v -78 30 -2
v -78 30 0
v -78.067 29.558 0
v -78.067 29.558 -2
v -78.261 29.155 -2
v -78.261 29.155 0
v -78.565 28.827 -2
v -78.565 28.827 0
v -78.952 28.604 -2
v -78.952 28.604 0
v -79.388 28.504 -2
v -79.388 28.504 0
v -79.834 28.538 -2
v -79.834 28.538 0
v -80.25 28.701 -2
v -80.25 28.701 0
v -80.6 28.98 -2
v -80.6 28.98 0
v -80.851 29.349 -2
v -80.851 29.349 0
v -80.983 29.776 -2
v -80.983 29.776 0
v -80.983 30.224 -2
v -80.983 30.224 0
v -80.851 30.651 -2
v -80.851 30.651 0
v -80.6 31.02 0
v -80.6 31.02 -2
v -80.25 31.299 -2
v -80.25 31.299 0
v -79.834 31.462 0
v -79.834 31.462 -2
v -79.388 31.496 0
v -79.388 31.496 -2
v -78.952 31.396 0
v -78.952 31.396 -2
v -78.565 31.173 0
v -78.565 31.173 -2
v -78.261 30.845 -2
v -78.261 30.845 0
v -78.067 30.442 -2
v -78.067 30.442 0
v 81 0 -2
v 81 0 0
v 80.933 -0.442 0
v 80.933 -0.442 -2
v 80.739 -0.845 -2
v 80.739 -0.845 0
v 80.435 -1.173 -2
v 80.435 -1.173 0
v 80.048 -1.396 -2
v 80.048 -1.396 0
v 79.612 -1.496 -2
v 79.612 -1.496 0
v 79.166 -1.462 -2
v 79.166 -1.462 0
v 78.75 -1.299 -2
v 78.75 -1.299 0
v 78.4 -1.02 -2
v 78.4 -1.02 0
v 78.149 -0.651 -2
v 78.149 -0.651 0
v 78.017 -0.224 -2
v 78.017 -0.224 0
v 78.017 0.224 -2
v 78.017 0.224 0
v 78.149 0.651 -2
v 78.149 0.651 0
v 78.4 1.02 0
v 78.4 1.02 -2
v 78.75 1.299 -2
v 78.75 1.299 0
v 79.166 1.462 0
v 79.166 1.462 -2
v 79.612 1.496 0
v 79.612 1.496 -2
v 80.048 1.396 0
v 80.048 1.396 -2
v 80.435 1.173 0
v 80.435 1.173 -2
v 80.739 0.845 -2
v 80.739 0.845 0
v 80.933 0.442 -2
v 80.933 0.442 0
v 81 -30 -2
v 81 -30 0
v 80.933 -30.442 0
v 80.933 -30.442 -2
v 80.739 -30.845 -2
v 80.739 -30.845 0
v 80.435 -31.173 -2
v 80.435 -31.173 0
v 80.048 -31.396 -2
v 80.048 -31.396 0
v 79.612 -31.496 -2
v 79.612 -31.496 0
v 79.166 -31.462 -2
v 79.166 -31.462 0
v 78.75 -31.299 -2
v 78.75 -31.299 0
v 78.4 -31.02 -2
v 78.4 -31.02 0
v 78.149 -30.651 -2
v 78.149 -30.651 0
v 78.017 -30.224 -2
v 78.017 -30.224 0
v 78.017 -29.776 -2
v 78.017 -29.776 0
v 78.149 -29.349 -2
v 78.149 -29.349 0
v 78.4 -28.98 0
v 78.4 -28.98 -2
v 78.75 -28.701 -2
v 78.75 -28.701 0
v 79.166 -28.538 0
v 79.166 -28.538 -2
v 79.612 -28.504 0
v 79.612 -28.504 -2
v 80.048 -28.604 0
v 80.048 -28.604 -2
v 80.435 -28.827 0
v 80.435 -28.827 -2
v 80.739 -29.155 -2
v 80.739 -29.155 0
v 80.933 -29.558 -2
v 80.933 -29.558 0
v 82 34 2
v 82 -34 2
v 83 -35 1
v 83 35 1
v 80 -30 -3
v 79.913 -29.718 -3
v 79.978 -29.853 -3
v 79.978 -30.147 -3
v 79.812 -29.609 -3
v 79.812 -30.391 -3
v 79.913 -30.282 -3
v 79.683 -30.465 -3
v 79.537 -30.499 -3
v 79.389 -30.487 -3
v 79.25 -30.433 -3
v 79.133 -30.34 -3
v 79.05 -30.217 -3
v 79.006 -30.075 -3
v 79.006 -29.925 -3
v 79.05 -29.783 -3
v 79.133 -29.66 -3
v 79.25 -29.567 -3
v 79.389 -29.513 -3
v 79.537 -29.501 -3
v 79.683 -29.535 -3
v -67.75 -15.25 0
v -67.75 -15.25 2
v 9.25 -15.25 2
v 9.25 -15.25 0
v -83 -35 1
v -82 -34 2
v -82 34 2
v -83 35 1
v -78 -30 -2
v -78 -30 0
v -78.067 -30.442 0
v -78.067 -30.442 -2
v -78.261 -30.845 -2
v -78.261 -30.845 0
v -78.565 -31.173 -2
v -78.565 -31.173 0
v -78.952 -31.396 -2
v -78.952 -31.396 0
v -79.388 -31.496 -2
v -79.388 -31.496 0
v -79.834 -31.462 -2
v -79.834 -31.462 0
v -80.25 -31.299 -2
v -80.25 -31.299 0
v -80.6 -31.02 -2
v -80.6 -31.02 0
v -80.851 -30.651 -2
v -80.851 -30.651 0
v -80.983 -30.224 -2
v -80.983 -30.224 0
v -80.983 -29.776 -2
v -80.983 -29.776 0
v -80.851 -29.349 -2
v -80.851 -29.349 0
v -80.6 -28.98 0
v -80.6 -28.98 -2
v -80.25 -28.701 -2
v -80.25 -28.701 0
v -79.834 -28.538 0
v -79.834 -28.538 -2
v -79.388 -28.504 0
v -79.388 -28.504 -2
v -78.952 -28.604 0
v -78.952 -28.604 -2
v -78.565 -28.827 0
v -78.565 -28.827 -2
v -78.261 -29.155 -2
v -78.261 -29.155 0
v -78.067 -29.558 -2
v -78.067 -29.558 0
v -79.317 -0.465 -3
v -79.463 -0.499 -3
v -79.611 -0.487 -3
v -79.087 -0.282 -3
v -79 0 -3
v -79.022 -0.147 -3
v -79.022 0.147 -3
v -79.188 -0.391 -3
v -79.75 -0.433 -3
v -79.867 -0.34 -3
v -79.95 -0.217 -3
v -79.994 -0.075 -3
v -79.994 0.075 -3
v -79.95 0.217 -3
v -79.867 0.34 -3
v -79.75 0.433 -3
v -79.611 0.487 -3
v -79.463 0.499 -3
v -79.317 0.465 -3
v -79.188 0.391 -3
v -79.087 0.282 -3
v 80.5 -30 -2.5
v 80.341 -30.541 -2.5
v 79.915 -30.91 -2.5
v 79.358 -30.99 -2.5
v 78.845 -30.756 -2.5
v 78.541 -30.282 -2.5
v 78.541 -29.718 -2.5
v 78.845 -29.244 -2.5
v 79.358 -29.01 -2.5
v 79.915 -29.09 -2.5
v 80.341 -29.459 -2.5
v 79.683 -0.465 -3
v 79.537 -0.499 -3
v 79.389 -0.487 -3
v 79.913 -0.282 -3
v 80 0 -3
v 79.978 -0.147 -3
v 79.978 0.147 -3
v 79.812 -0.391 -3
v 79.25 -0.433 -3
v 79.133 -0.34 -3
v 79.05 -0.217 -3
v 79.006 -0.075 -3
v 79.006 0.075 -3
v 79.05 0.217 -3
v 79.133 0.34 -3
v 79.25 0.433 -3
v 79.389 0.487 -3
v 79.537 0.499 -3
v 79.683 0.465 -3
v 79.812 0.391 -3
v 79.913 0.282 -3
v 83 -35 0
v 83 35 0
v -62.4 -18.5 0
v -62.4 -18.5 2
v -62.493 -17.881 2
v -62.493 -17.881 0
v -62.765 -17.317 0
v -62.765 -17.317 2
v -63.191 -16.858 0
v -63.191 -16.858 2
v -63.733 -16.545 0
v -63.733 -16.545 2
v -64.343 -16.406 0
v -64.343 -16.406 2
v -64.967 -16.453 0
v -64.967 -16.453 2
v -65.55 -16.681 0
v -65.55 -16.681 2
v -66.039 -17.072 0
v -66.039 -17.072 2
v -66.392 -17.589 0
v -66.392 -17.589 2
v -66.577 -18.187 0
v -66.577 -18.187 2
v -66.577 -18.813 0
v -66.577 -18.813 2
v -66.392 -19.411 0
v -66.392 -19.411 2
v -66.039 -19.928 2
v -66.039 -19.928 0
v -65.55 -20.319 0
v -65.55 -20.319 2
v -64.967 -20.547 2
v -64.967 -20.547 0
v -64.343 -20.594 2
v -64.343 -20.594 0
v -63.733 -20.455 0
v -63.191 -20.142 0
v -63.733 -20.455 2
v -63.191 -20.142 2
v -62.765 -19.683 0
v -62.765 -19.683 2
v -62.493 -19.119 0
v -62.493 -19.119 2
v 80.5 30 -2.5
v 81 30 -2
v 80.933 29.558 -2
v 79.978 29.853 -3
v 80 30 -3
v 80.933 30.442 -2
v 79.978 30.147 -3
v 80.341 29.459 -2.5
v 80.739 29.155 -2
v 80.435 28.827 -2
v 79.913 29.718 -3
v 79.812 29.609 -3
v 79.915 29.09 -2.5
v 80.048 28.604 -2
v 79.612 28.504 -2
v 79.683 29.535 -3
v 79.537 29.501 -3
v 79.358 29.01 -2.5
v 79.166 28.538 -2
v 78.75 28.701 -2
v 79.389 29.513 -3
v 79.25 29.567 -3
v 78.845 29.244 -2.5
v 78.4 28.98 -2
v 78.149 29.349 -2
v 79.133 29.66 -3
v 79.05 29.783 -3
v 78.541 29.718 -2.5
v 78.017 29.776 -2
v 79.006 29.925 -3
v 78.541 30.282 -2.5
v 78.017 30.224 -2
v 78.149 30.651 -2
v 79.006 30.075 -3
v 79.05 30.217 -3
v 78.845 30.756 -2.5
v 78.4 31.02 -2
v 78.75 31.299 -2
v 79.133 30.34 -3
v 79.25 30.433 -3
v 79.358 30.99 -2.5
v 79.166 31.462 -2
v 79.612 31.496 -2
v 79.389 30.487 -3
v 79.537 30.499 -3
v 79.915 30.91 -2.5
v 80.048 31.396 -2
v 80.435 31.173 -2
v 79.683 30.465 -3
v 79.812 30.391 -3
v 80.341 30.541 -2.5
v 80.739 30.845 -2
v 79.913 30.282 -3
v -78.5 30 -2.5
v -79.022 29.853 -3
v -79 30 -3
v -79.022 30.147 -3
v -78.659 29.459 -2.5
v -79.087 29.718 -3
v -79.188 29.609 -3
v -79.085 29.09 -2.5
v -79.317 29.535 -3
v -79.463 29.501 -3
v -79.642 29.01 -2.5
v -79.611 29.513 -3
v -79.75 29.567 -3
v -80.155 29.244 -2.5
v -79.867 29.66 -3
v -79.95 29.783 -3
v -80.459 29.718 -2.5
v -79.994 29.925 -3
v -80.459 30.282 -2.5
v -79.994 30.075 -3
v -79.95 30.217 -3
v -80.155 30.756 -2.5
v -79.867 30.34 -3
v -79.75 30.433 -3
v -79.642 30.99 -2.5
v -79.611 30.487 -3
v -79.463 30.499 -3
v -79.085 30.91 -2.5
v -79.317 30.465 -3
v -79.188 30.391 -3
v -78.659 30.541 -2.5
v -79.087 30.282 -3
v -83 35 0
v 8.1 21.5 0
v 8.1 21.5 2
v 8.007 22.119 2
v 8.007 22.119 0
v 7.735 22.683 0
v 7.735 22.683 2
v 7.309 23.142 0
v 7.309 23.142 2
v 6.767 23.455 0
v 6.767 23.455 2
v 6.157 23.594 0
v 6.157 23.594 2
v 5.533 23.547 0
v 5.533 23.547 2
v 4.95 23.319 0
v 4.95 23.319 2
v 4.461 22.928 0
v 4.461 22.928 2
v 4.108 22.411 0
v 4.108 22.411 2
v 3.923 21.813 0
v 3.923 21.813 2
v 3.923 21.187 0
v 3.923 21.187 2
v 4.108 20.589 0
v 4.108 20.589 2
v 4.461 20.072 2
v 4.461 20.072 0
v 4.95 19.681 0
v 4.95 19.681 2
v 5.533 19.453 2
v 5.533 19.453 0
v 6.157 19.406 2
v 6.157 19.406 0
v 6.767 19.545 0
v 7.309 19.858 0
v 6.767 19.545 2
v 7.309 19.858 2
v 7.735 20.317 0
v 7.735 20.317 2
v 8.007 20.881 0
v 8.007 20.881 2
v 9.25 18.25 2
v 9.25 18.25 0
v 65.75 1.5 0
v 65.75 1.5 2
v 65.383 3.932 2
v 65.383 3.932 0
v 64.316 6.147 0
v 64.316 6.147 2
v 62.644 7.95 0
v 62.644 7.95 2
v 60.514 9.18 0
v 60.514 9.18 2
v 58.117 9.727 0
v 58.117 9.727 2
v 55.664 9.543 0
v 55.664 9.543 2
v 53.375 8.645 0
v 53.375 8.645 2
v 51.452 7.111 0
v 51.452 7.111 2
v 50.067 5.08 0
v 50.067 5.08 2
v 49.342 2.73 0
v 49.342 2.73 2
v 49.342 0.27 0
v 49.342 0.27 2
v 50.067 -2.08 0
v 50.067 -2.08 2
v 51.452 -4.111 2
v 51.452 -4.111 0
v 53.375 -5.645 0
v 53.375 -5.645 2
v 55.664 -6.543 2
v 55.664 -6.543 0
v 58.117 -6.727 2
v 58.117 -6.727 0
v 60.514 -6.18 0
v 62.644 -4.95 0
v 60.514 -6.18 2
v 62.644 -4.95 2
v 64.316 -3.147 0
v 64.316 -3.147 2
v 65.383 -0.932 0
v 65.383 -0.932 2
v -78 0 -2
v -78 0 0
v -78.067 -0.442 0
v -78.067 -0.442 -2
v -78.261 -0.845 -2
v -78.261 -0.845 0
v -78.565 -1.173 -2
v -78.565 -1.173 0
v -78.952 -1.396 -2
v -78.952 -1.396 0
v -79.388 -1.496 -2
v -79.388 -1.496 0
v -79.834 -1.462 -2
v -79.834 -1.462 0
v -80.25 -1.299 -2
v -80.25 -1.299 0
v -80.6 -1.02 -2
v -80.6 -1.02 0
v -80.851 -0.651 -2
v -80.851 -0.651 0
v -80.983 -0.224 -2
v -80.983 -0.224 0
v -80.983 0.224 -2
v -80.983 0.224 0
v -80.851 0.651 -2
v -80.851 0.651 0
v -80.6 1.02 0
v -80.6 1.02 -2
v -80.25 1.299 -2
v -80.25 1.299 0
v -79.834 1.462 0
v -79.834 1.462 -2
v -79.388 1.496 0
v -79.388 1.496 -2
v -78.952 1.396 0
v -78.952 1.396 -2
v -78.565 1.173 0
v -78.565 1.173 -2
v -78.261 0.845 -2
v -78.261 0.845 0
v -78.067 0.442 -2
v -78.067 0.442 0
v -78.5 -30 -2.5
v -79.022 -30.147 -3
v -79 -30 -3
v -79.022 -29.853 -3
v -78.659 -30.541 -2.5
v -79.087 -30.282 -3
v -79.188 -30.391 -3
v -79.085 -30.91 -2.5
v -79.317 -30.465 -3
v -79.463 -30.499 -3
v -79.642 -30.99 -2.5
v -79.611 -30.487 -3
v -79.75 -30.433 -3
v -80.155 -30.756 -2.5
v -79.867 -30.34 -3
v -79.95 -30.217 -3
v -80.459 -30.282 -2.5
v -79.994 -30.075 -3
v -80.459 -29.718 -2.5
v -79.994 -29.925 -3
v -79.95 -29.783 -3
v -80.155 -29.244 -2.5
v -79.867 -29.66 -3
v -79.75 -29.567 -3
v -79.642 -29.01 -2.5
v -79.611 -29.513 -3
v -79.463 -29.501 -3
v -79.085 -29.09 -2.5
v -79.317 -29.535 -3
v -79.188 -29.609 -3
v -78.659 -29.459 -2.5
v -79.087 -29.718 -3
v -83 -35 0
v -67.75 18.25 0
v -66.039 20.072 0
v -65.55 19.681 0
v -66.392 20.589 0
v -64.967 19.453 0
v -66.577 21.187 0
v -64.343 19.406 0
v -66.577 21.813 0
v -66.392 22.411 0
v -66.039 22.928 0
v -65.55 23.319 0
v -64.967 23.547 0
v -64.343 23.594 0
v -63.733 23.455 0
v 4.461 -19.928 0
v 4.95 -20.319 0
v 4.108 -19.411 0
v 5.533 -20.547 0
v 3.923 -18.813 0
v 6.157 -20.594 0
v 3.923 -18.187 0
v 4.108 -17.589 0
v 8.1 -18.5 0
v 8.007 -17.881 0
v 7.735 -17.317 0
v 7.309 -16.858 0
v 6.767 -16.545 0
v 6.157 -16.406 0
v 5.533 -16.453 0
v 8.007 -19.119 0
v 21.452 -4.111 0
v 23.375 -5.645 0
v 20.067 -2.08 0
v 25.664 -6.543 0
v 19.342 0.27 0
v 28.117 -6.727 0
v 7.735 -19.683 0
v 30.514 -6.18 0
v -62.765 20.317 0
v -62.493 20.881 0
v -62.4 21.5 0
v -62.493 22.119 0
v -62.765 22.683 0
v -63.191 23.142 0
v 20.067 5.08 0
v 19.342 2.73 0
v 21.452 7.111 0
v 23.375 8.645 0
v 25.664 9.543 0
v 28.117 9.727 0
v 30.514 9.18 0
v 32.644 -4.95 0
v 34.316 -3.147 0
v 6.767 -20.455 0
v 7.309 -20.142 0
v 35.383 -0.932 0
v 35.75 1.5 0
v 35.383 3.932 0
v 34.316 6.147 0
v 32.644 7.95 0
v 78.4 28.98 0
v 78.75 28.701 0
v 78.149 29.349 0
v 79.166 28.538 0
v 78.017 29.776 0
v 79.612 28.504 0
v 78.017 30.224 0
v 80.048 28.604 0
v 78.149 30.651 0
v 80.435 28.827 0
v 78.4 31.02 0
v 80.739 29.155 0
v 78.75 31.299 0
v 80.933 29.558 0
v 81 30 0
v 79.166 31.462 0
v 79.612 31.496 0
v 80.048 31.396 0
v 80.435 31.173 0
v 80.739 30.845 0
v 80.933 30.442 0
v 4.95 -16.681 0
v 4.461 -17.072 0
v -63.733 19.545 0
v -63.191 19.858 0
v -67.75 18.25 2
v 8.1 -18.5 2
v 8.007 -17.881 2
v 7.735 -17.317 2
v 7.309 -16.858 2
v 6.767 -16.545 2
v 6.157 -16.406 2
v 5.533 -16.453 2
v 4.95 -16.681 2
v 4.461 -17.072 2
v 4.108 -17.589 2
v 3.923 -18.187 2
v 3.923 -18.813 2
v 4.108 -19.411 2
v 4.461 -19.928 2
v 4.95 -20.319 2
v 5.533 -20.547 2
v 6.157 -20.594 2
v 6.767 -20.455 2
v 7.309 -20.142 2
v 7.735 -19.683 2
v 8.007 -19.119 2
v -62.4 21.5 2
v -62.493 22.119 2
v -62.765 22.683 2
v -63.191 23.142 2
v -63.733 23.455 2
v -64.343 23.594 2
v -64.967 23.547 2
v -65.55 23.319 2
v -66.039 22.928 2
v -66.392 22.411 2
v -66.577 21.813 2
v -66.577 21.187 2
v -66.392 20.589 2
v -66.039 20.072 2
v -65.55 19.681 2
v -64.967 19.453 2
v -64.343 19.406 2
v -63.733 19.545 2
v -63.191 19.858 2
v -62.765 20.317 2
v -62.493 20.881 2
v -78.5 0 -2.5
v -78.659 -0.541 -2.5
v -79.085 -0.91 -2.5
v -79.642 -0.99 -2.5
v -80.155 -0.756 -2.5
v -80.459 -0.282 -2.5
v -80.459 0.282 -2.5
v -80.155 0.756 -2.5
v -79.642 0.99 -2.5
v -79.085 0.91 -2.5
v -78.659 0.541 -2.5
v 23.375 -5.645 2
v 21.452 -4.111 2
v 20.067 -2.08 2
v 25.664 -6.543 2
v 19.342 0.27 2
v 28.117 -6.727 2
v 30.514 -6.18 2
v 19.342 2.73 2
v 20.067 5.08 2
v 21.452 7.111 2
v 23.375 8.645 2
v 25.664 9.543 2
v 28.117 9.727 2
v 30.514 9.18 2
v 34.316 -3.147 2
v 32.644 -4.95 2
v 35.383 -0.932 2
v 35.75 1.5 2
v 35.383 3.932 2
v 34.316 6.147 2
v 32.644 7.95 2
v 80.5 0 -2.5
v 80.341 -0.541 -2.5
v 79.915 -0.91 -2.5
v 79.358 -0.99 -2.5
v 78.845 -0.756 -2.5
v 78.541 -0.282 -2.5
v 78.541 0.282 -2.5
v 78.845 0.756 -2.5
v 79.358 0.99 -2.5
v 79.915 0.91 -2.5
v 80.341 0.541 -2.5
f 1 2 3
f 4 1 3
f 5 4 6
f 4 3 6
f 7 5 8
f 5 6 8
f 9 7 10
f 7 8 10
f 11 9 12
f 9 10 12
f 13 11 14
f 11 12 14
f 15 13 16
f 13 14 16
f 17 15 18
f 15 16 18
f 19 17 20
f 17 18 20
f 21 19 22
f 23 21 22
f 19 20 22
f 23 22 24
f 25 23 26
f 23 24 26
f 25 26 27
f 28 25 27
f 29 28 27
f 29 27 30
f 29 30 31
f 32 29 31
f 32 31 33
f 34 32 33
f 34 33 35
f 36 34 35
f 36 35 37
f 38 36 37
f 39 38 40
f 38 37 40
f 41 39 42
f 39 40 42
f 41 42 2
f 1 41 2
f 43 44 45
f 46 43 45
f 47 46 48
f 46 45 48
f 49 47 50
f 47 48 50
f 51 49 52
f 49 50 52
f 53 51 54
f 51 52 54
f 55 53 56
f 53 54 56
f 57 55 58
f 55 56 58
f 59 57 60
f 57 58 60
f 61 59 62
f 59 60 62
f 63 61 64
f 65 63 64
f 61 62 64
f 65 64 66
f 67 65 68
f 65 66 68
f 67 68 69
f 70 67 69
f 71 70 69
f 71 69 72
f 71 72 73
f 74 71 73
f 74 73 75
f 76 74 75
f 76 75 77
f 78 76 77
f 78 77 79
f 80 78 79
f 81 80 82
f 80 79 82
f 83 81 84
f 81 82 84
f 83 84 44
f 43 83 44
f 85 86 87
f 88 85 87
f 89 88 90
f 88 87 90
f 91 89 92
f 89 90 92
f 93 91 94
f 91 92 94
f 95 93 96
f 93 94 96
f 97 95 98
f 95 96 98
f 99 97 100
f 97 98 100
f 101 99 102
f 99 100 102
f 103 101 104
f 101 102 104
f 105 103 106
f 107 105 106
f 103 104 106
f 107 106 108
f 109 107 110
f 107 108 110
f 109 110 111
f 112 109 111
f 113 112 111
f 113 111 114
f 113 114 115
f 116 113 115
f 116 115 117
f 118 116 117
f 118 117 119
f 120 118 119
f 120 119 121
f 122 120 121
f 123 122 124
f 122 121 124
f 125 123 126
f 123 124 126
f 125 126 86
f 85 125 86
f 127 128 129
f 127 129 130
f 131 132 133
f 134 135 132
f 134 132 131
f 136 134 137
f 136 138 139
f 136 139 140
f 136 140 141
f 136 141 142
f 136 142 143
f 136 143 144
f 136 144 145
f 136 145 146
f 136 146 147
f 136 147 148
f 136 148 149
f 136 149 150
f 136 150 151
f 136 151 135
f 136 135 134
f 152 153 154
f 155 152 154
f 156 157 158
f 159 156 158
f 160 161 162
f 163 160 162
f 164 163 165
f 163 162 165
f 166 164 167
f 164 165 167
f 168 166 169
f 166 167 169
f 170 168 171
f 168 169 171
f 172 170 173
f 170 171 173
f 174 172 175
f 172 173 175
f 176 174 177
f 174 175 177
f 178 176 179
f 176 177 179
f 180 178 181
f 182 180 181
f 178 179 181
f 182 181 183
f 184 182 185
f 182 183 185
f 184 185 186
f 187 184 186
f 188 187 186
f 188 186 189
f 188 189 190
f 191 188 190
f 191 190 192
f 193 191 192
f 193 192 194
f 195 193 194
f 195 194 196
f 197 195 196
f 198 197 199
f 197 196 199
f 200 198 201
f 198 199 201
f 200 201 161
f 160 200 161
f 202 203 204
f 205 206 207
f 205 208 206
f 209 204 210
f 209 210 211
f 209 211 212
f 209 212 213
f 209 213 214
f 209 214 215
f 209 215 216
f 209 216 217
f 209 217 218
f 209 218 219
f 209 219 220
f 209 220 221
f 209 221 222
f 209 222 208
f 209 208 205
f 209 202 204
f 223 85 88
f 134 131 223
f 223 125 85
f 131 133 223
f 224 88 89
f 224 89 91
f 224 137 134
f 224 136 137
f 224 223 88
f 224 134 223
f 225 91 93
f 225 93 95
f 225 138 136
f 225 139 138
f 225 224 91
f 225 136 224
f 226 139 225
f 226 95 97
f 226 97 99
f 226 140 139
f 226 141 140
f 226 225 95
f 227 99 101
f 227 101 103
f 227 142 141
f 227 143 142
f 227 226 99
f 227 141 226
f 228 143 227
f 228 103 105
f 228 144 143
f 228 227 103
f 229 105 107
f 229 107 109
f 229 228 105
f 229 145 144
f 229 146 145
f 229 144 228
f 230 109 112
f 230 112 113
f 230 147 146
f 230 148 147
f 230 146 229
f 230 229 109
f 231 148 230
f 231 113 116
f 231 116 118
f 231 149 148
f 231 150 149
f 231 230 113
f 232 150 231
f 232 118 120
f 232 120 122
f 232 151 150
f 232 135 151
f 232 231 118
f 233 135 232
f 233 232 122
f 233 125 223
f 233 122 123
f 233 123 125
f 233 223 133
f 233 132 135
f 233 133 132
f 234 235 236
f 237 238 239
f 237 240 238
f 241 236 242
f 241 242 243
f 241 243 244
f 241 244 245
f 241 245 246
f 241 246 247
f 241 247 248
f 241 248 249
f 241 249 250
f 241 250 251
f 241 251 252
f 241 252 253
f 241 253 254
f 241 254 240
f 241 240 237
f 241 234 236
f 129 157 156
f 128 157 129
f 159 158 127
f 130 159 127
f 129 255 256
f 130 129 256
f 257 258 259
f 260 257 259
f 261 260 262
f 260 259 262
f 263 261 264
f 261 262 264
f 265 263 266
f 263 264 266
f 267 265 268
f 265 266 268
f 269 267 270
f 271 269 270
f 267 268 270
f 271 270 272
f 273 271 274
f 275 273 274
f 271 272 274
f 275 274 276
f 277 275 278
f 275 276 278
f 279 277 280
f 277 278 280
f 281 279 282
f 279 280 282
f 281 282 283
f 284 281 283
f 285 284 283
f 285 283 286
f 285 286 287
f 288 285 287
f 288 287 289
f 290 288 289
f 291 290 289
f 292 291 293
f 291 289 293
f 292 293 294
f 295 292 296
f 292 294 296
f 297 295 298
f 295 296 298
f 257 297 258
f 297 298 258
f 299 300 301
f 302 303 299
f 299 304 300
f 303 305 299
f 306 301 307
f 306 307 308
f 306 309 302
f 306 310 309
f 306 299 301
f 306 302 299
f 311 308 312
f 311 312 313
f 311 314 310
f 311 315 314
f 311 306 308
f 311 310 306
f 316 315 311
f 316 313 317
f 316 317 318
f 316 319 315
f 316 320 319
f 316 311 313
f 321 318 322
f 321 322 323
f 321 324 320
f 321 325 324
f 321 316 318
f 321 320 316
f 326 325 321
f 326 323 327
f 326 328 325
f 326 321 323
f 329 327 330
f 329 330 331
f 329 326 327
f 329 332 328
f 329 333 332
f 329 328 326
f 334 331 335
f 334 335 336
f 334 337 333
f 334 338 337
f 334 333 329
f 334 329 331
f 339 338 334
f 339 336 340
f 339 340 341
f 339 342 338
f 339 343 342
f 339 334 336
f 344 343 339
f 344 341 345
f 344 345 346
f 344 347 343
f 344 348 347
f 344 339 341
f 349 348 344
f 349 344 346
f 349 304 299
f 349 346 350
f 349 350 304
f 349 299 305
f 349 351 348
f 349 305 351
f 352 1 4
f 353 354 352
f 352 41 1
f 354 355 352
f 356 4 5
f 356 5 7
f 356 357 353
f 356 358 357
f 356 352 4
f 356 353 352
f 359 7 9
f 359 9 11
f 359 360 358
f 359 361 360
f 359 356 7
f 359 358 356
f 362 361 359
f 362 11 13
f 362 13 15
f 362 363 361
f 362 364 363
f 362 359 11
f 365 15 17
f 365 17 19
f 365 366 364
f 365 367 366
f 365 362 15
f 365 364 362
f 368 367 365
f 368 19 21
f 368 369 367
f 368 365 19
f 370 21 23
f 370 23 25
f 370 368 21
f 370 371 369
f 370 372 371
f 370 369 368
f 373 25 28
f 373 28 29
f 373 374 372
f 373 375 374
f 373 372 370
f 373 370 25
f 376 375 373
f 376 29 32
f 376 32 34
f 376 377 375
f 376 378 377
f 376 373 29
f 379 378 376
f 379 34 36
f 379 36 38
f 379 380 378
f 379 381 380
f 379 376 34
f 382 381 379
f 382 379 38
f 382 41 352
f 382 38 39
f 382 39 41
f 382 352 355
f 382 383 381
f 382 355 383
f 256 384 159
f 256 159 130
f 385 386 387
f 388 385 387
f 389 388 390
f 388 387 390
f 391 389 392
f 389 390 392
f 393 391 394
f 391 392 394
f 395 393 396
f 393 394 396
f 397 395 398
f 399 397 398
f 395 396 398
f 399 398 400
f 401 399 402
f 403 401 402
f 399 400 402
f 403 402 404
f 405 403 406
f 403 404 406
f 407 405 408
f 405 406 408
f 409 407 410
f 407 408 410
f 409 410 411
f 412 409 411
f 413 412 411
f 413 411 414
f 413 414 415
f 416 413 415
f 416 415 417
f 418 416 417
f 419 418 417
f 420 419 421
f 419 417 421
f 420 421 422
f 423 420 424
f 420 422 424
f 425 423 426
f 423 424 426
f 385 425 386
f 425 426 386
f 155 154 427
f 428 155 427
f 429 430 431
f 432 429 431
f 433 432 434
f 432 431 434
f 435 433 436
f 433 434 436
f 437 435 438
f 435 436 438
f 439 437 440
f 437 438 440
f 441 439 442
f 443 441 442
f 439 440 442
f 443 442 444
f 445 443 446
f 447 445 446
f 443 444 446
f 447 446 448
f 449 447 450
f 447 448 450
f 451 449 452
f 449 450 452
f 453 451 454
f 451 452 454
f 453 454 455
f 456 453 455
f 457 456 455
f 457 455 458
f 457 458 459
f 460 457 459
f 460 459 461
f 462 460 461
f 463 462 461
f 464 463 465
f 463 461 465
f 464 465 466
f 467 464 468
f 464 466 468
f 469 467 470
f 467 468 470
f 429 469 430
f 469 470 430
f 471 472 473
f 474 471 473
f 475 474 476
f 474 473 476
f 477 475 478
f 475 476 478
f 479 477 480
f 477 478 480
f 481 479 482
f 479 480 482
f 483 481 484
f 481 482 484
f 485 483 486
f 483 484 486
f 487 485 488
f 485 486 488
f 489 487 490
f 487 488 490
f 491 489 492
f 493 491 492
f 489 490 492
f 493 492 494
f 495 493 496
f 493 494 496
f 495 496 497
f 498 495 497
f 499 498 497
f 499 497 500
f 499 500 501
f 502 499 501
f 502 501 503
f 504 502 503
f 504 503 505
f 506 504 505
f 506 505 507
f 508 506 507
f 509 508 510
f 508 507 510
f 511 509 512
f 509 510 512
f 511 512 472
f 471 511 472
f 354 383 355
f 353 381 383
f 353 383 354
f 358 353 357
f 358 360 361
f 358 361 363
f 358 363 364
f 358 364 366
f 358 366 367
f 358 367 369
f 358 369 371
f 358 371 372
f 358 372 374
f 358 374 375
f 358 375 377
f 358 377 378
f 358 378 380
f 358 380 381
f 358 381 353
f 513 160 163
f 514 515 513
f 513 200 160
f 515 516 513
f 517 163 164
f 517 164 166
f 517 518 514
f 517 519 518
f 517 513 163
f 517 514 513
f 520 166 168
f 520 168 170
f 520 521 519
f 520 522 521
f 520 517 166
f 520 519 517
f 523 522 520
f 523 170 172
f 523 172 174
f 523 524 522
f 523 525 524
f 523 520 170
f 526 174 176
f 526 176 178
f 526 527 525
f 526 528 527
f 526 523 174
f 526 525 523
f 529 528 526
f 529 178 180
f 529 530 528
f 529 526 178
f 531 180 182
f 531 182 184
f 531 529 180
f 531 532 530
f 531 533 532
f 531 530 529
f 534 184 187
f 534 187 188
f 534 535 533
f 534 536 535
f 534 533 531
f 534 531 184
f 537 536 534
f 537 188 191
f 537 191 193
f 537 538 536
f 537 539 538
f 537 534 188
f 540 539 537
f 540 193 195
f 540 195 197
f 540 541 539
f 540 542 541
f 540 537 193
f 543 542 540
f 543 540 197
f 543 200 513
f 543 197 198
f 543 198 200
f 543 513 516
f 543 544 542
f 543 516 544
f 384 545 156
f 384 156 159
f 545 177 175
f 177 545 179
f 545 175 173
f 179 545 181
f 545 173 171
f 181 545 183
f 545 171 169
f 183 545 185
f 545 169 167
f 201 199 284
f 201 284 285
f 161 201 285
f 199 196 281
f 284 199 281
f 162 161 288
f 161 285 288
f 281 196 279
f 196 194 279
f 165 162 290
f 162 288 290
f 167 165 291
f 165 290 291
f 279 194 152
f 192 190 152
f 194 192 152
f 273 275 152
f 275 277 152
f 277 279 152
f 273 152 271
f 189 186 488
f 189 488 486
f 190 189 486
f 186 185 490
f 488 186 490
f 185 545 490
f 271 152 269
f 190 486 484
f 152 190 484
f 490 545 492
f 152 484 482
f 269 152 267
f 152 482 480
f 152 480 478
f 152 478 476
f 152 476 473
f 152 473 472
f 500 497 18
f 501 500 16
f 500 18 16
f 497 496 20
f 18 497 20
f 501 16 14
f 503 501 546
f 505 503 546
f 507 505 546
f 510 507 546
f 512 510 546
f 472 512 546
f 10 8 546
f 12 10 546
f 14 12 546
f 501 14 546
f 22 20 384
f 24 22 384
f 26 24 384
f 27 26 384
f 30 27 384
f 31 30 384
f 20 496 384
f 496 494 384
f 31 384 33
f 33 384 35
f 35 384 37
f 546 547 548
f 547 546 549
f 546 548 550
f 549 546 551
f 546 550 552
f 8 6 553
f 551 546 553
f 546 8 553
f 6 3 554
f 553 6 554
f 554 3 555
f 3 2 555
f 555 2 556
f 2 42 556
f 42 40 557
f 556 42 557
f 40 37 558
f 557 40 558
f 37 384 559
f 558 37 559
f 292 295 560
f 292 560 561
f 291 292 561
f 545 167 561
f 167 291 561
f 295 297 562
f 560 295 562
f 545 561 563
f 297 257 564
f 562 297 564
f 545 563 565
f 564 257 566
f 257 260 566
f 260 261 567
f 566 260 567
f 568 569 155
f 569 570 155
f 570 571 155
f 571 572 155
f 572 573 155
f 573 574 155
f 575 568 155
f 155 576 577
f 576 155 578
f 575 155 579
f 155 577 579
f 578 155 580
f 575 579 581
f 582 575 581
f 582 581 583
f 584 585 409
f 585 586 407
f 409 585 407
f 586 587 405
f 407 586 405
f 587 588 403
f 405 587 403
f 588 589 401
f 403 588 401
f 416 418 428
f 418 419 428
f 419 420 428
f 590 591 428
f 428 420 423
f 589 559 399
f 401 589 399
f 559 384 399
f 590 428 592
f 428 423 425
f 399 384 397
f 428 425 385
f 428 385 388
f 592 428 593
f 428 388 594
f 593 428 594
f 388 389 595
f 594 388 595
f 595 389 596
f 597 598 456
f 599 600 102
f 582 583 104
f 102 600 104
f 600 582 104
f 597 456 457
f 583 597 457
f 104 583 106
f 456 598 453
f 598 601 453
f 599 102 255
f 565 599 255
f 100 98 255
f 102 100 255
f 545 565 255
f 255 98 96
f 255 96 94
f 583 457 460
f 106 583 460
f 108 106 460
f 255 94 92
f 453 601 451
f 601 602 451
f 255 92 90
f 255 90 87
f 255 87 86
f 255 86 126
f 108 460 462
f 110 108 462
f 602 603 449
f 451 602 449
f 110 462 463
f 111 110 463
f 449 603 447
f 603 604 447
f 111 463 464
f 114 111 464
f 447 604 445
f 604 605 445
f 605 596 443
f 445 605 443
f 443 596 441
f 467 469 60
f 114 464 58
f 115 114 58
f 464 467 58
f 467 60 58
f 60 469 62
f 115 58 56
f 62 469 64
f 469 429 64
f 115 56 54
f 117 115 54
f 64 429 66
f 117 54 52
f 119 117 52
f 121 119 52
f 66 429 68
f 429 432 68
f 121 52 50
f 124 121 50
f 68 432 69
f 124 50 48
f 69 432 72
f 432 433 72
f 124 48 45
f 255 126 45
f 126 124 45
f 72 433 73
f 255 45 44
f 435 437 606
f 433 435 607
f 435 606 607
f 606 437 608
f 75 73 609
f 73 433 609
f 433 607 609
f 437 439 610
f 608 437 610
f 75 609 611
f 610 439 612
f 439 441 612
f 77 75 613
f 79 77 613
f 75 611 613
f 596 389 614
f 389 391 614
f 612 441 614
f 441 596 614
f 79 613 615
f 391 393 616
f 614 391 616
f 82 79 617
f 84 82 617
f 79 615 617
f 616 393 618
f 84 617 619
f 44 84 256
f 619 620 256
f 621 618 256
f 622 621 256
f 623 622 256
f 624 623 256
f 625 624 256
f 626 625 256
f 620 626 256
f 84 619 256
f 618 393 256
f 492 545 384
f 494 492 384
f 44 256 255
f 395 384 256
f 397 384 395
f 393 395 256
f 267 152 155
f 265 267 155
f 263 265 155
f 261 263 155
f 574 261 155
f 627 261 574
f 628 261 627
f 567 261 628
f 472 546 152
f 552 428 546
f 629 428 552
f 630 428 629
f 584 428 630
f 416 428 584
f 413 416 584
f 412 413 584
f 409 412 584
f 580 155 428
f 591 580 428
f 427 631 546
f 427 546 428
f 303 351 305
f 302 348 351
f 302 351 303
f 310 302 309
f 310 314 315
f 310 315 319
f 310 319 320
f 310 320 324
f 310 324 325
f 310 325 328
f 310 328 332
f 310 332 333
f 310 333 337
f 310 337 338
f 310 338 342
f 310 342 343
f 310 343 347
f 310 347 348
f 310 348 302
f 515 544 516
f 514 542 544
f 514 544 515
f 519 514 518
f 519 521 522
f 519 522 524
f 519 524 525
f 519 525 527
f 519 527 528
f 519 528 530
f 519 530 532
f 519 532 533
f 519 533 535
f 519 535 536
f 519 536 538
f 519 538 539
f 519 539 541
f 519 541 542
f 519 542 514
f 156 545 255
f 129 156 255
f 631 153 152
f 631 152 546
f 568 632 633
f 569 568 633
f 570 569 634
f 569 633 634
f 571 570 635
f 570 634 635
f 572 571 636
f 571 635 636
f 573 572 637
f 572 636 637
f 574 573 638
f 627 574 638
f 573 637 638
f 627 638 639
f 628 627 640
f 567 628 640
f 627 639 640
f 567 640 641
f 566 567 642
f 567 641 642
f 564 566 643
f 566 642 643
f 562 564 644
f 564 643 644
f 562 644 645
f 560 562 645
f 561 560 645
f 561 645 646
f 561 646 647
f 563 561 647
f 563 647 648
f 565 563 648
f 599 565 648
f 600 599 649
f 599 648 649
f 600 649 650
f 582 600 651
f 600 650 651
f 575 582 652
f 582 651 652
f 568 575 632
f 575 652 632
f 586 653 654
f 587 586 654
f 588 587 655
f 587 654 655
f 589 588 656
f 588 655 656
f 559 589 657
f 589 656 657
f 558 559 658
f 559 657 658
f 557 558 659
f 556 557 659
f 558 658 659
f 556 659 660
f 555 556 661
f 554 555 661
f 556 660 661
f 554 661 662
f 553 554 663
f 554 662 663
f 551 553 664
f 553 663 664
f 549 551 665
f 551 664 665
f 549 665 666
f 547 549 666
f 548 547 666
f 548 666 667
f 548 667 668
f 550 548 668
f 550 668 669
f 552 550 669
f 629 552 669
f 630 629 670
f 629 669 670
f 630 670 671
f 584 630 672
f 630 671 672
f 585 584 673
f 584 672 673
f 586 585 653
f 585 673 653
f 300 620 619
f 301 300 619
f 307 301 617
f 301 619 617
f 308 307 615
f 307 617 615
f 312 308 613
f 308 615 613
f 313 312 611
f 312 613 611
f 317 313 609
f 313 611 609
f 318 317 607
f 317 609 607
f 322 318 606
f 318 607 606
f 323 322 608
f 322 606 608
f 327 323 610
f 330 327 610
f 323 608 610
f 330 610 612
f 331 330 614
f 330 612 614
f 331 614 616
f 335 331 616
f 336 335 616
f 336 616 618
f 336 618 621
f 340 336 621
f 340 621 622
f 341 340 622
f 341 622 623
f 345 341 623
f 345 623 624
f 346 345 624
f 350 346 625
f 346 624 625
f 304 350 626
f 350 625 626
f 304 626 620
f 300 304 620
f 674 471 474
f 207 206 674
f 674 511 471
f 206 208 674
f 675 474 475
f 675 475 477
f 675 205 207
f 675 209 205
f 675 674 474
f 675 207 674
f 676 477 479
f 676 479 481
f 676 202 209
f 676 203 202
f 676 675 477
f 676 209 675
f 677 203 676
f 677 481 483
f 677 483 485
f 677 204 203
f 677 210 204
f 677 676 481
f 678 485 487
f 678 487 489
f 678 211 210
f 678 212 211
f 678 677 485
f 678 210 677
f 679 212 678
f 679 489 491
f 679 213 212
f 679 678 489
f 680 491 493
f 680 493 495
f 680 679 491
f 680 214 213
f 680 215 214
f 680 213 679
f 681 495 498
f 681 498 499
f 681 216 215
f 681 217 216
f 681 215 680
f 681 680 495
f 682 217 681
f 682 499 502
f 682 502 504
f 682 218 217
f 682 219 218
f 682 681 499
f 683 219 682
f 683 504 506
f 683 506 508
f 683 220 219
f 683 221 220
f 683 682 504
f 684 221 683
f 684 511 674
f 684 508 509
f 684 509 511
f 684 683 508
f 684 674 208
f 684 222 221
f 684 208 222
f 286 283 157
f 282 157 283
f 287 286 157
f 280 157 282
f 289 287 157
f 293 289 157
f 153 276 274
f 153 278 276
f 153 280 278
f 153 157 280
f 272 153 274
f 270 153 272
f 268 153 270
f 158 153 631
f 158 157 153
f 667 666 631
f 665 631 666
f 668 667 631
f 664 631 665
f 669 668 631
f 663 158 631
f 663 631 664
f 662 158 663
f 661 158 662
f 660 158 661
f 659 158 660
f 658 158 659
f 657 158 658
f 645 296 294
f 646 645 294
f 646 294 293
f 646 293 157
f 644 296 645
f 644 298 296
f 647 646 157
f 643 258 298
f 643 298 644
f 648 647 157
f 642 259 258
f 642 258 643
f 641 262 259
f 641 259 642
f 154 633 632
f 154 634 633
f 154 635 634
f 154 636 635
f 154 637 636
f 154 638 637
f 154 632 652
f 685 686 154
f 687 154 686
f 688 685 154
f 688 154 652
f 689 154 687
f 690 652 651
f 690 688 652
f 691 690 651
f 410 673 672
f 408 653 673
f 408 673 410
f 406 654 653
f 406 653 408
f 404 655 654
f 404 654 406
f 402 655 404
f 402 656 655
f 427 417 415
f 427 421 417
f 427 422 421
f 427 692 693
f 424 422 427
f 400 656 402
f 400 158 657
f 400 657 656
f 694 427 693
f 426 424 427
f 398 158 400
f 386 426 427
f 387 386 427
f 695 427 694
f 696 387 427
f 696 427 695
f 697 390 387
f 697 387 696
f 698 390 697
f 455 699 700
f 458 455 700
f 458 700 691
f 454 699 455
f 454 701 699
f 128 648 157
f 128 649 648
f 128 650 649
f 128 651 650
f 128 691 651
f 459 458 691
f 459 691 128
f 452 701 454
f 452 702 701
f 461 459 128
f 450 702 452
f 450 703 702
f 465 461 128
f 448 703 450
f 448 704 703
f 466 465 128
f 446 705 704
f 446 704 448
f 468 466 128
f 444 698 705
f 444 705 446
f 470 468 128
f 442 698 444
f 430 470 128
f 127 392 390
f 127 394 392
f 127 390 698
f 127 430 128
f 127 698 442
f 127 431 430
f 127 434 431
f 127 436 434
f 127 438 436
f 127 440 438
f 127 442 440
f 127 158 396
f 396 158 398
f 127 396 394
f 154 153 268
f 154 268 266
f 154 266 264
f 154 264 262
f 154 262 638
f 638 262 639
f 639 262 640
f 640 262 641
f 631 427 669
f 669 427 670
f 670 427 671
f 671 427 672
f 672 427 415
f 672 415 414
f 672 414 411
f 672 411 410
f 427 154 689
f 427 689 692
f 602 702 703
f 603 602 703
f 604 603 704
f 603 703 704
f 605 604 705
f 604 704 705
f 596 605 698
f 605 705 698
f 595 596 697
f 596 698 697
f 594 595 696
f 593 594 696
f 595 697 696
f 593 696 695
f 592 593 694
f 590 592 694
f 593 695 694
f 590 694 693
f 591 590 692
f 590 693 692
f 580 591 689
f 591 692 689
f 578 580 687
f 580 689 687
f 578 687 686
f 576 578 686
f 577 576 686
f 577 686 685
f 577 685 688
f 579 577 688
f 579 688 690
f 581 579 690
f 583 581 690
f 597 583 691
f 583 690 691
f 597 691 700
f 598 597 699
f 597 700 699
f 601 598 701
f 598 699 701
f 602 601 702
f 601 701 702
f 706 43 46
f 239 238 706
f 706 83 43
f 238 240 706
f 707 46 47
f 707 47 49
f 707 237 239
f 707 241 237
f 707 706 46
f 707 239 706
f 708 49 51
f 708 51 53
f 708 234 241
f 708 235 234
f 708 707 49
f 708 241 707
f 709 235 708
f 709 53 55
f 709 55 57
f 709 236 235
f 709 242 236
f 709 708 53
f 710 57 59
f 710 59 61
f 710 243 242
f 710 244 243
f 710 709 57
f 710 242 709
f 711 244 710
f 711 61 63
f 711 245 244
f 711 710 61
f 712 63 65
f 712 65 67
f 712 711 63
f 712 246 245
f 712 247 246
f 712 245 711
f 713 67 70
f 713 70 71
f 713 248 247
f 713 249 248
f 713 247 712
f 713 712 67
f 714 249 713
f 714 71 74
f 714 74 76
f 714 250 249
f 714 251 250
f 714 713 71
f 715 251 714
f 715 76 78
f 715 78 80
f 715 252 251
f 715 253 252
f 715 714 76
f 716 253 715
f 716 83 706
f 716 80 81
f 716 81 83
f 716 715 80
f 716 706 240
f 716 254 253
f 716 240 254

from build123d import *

# Parameters (mm, degrees)
F0_W     = 166
F0_H     = 70
F1_DEPTH = 2
F2_W     = 77
F2_H     = 33.5
F2_R     = 2.1
F2_R_2   = 8.25
F3_DEPTH = 2
F4_R     = 1.5
F5_DEPTH = 3
F6_SIZE  = 1
F7_SIZE  = 1


with BuildPart() as f1:
    # F0 (on Top) → F1 (new body)
    with BuildSketch(Plane.XY):
        Rectangle(F0_W, F0_H)
    extrude(amount=F1_DEPTH)

    # F2 (on face) → F3 (cut, through all)
    with BuildSketch(Plane.XY.offset(2)):
        with Locations((-29.25, 1.5)):
            Rectangle(F2_W, F2_H)
        with Locations((-64.5, 21.5)):
            Circle(F2_R)
        with Locations((6, 21.5)):
            Circle(F2_R)
        with Locations((6, -18.5)):
            Circle(F2_R)
        with Locations((-64.5, -18.5)):
            Circle(F2_R)
        with Locations((27.5, 1.5)):
            Circle(F2_R_2)
        with Locations((57.5, 1.5)):
            Circle(F2_R_2)
    extrude(amount=-F3_DEPTH, mode=Mode.SUBTRACT)

    # F4 (on face) → F5 (join)
    with BuildSketch(Plane(origin=(0, 0, 0), x_dir=(1, 0, 0), z_dir=(0, 0, -1))):
        with Locations((-79.5, 30)):
            Circle(F4_R)
        with Locations((-79.5, -30)):
            Circle(F4_R)
        with Locations((-79.5, 0)):
            Circle(F4_R)
        with Locations((79.5, -30)):
            Circle(F4_R)
        with Locations((79.5, 30)):
            Circle(F4_R)
        with Locations((79.5, 0)):
            Circle(F4_R)
    extrude(amount=F5_DEPTH)

    # F6
    f6_edges = [f1.edges().sort_by_distance(p)[0] for p in [
        (-81, -30, -3),
        (-81, 0, -3),
        (-81, 30, -3),
        (78, 30, -3),
        (78, 0, -3),
        (78, -30, -3),
    ]]
    chamfer(f6_edges, length=F6_SIZE)

    # F7
    f7_edges = [f1.edges().sort_by_distance(p)[0] for p in [
        (83, 0, 2),
        (0, -35, 2),
        (-83, 0, 2),
        (0, 35, 2),
    ]]
    chamfer(f7_edges, length=F7_SIZE)


solid = f1.part
